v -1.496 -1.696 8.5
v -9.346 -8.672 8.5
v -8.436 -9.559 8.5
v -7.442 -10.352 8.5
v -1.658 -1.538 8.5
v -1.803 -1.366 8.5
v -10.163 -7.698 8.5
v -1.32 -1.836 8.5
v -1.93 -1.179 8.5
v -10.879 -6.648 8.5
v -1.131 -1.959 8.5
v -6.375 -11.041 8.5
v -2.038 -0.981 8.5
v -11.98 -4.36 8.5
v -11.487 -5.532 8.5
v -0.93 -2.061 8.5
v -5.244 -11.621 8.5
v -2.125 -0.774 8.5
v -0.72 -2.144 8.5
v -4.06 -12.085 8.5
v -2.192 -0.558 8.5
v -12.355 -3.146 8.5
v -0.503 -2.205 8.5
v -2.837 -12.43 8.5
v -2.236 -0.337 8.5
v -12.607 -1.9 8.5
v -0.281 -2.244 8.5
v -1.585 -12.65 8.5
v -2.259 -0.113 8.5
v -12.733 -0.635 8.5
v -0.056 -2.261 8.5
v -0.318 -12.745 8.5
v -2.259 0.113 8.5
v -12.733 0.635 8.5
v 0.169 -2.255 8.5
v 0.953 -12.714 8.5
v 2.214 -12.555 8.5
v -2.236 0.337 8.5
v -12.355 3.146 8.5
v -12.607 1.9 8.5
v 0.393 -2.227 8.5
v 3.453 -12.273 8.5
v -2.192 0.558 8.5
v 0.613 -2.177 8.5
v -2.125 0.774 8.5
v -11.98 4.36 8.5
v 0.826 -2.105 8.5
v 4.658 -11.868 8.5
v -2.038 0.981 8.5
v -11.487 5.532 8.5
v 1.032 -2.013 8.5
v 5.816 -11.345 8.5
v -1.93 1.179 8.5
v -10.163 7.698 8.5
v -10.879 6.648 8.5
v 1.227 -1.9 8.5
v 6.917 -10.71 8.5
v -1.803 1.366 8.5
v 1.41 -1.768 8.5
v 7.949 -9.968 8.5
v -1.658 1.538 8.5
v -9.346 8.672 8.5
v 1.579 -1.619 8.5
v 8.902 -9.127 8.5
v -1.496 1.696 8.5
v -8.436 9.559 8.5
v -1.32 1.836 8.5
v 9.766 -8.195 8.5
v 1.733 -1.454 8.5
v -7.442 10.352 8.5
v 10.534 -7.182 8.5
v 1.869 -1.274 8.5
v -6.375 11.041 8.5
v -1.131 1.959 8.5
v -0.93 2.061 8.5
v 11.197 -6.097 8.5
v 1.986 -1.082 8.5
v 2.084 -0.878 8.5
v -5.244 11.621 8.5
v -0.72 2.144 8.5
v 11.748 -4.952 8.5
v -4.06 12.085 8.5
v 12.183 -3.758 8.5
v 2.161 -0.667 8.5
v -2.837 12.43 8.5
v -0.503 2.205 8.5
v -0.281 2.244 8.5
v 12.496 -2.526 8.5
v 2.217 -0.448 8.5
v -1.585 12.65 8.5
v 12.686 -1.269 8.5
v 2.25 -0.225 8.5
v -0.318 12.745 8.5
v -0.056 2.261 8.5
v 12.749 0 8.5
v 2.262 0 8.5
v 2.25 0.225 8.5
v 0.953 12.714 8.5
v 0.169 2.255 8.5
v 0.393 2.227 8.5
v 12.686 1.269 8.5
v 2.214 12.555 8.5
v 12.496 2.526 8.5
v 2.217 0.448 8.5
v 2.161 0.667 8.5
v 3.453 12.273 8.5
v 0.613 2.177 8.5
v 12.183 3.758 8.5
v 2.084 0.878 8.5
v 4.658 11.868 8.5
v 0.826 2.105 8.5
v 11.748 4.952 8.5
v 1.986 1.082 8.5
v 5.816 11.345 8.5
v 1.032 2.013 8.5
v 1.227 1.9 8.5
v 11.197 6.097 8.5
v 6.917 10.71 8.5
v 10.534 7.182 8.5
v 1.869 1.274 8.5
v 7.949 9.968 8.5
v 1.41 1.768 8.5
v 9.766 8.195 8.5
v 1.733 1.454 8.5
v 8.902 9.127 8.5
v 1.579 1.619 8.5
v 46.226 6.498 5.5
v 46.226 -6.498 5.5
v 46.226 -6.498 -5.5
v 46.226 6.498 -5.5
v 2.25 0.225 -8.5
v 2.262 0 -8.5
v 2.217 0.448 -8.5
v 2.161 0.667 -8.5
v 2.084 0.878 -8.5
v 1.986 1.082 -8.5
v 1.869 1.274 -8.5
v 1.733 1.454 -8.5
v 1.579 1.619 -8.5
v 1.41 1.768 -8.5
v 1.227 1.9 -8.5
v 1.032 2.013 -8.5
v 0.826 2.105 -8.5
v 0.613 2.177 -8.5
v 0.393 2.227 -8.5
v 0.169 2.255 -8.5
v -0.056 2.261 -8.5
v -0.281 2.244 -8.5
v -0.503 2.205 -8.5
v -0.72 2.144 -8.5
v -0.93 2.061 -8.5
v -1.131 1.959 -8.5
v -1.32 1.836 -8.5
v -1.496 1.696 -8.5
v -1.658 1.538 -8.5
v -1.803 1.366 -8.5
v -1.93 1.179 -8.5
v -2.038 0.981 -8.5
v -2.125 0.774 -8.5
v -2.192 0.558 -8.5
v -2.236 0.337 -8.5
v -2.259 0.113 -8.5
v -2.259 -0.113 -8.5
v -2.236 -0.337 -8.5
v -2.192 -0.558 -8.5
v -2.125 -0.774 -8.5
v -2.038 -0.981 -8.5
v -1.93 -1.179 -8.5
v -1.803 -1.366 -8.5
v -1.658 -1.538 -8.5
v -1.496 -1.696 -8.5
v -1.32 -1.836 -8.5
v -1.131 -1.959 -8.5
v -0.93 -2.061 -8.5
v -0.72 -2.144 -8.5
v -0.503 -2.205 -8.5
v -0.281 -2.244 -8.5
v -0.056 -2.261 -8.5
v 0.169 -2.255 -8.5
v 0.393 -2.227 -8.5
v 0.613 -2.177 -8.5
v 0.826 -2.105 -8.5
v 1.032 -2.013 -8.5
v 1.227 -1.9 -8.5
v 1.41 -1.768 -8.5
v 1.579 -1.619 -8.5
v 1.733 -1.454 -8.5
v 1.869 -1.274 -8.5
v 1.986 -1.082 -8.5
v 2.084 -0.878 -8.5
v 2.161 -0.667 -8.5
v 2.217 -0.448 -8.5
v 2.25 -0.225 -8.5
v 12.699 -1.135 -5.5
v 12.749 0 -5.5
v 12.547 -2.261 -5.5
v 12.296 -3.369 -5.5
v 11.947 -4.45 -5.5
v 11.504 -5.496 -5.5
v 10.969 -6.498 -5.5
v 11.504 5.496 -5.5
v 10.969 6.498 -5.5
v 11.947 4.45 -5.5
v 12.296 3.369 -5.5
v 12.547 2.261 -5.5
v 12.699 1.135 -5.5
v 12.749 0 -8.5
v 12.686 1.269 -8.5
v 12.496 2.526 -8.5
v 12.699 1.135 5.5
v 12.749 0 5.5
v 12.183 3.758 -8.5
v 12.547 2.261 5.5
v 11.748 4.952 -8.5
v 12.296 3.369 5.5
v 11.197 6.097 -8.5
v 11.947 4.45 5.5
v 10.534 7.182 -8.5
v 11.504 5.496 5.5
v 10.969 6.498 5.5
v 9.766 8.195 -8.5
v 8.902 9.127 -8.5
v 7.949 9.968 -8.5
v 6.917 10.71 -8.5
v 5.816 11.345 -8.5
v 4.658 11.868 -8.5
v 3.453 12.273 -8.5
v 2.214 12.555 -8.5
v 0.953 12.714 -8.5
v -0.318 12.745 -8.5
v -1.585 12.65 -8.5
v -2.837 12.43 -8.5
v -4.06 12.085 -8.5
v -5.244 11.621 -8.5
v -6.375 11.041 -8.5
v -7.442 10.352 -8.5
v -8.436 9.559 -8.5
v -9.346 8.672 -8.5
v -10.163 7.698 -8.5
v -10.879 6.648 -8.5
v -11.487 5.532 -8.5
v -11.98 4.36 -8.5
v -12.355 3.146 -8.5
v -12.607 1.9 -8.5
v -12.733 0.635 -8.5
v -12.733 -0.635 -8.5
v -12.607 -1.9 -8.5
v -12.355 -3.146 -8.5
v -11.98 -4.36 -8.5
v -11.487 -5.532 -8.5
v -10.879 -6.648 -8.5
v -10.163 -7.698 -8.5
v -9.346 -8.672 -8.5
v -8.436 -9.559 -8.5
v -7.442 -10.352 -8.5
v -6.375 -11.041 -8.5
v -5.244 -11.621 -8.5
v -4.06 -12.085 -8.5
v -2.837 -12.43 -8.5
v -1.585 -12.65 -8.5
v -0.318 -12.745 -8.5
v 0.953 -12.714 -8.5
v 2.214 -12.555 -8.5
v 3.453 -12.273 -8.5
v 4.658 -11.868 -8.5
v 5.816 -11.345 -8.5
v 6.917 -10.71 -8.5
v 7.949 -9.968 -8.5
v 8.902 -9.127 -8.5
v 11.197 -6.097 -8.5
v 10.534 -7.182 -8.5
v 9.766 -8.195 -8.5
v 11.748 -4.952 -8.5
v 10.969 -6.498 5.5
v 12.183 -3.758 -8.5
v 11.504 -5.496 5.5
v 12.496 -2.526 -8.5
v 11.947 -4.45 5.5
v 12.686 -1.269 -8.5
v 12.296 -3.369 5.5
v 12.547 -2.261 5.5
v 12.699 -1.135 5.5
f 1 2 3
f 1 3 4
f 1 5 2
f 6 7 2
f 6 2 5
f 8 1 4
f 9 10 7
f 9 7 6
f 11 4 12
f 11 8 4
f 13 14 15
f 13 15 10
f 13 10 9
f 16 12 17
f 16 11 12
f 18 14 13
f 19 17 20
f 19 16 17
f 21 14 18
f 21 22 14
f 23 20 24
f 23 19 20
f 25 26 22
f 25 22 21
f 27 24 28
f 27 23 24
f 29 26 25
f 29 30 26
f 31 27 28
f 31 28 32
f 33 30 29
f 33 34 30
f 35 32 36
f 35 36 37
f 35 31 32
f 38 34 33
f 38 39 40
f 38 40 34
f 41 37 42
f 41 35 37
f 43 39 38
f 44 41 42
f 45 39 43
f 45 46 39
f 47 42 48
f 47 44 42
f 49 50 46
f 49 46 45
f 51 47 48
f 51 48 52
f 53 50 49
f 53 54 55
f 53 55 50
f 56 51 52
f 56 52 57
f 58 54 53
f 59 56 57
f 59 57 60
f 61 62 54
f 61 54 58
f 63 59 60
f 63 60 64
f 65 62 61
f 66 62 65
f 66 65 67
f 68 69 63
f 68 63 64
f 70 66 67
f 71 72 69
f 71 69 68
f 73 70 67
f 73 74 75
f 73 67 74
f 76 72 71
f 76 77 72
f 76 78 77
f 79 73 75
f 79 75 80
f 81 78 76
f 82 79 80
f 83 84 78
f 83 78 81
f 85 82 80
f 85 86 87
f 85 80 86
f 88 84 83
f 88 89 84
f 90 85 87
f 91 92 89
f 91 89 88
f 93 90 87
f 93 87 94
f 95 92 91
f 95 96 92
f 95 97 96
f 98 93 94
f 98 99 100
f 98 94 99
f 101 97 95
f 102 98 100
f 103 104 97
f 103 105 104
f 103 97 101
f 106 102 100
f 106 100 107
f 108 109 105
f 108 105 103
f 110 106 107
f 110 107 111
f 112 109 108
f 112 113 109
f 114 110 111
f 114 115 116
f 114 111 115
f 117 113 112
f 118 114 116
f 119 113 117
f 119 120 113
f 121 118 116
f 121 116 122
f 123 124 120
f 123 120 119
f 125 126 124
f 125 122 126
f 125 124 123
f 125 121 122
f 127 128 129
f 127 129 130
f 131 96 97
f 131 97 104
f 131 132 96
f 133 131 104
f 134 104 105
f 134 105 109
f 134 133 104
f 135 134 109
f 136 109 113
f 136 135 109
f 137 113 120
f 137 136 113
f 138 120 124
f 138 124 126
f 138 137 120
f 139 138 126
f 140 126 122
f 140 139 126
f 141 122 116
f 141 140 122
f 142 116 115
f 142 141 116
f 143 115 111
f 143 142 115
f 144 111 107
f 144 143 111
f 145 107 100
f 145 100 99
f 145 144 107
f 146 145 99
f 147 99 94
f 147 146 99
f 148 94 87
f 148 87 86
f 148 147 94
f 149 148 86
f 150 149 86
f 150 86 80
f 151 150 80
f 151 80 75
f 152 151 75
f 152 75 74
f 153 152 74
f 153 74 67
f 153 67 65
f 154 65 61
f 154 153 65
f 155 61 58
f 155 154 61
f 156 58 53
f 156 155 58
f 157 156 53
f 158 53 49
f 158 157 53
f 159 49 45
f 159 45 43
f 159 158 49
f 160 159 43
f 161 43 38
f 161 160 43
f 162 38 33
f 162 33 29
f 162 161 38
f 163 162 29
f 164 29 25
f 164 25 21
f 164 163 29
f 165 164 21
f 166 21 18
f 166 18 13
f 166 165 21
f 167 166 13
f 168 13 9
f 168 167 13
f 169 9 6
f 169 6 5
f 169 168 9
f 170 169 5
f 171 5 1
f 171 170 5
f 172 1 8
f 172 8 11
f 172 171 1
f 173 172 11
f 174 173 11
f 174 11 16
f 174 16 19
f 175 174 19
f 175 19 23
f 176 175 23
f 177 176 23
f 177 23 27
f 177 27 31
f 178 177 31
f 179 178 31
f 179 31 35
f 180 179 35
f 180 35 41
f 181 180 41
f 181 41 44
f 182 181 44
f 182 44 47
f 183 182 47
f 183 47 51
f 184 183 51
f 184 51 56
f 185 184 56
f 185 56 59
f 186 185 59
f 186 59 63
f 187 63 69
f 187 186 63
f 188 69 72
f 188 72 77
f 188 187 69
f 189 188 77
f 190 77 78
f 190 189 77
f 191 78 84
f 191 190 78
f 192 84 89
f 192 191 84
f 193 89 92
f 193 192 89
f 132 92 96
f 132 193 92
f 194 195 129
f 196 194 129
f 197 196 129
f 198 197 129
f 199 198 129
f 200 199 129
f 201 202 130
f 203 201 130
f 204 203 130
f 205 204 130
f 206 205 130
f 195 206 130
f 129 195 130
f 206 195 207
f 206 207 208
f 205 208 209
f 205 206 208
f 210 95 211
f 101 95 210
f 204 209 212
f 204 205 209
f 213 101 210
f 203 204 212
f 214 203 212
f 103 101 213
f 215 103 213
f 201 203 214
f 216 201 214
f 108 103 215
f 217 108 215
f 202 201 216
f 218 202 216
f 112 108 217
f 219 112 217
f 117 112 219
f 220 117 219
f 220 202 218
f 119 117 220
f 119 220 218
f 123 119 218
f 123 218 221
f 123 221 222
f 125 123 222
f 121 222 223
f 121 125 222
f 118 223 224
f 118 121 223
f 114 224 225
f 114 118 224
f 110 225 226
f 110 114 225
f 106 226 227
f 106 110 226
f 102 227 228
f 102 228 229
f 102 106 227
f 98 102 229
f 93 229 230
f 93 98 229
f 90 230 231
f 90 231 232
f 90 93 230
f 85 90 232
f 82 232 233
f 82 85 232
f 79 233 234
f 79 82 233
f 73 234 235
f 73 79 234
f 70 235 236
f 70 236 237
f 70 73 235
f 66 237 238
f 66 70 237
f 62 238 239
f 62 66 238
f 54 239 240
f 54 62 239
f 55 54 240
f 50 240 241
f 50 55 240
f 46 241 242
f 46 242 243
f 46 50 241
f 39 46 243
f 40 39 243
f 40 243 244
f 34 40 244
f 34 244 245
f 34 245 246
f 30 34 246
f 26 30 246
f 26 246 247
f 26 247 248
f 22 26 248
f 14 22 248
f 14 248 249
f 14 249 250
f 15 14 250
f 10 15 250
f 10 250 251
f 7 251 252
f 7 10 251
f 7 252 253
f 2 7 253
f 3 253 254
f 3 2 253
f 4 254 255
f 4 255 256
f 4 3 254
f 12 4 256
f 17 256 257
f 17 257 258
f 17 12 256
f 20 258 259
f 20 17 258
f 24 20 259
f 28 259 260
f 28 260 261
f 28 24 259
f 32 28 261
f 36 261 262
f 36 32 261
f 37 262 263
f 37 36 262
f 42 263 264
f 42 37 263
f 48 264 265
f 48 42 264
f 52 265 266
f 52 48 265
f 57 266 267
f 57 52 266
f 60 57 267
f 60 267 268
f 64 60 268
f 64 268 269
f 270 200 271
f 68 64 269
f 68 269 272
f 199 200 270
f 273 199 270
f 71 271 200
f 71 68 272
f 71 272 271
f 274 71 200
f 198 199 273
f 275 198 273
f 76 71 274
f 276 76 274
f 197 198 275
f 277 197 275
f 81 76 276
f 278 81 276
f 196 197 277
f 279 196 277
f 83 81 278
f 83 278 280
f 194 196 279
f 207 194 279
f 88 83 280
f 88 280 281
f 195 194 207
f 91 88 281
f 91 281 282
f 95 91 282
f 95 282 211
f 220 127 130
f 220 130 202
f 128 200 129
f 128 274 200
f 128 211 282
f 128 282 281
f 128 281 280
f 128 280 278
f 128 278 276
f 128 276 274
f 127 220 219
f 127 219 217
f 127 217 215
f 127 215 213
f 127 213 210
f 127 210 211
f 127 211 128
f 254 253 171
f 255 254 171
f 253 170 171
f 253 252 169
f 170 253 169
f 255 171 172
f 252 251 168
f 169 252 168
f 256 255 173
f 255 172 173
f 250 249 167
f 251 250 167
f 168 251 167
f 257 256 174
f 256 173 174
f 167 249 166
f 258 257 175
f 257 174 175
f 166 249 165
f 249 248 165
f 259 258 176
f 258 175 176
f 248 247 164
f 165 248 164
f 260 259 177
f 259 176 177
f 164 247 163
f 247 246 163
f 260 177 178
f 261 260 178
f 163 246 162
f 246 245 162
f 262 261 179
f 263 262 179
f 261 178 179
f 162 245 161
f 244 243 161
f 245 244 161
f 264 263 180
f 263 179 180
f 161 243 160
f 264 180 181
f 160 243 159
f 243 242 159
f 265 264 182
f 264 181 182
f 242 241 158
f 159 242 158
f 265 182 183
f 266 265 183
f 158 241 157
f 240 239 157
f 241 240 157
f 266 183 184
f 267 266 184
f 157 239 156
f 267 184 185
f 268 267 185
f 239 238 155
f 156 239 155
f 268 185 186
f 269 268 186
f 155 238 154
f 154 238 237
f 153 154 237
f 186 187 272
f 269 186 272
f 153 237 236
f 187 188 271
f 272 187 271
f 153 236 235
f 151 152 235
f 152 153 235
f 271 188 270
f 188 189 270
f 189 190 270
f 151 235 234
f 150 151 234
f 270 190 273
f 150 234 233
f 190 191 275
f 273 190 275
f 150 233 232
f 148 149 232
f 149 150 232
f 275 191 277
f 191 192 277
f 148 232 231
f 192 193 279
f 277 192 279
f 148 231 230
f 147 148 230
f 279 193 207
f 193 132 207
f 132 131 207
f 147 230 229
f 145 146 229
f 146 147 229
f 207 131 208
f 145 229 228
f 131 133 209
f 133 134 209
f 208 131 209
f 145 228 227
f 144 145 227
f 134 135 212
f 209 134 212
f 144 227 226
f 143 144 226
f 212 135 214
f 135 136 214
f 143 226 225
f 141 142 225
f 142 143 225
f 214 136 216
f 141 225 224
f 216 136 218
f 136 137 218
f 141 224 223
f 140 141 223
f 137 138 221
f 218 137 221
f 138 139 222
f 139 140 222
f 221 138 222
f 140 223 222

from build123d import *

# Parameters (mm, degrees)
BOSS_EXTRUDE1_DEPTH = 5.5
SKETCH1_3_R         = 2.261632510671041
BOSS_EXTRUDE2_DEPTH = 8.499999999999996


with BuildPart() as part:
    # Sketch1 → Boss-Extrude1 (new, symmetric)
    with BuildSketch(Plane.XY):
        with BuildLine():
            Line((10.96881949776985, -6.498209588575632), (46.22624128009294, -6.498209588575632))
            Line((46.22624128009294, -6.498209588575632), (46.22624128009294, 6.498209588575632))
            Line((46.22624128009294, 6.498209588575632), (10.96881949776985, 6.498209588575632))
            ThreePointArc((10.96881949776985, 6.498209588575631), (12.296040881424664, 3.3688436701701763), (12.74918542620321, 0))
            ThreePointArc((12.74918542620321, -3.12e-15), (12.296040881424664, -3.3688436701701785), (10.96881949776985, -6.498209588575633))
        make_face()
    extrude(amount=BOSS_EXTRUDE1_DEPTH, both=True)

    # Sketch1<3> → Boss-Extrude2 (add, symmetric)
    with BuildSketch(Plane.XY):
        with BuildLine():
            ThreePointArc((10.96881949776985, 6.498209588575631), (-12.74918542620321, 1.56e-15), (10.96881949776985, -6.498209588575633))
            ThreePointArc((10.96881949776985, -6.498209588575633), (12.296040881424664, -3.3688436701701785), (12.74918542620321, -3.12e-15))
            ThreePointArc((12.74918542620321, 0), (12.296040881424664, 3.3688436701701763), (10.96881949776985, 6.498209588575631))
        make_face()
        Circle(SKETCH1_3_R, mode=Mode.SUBTRACT)
    extrude(amount=BOSS_EXTRUDE2_DEPTH, both=True)


solid = part.part
